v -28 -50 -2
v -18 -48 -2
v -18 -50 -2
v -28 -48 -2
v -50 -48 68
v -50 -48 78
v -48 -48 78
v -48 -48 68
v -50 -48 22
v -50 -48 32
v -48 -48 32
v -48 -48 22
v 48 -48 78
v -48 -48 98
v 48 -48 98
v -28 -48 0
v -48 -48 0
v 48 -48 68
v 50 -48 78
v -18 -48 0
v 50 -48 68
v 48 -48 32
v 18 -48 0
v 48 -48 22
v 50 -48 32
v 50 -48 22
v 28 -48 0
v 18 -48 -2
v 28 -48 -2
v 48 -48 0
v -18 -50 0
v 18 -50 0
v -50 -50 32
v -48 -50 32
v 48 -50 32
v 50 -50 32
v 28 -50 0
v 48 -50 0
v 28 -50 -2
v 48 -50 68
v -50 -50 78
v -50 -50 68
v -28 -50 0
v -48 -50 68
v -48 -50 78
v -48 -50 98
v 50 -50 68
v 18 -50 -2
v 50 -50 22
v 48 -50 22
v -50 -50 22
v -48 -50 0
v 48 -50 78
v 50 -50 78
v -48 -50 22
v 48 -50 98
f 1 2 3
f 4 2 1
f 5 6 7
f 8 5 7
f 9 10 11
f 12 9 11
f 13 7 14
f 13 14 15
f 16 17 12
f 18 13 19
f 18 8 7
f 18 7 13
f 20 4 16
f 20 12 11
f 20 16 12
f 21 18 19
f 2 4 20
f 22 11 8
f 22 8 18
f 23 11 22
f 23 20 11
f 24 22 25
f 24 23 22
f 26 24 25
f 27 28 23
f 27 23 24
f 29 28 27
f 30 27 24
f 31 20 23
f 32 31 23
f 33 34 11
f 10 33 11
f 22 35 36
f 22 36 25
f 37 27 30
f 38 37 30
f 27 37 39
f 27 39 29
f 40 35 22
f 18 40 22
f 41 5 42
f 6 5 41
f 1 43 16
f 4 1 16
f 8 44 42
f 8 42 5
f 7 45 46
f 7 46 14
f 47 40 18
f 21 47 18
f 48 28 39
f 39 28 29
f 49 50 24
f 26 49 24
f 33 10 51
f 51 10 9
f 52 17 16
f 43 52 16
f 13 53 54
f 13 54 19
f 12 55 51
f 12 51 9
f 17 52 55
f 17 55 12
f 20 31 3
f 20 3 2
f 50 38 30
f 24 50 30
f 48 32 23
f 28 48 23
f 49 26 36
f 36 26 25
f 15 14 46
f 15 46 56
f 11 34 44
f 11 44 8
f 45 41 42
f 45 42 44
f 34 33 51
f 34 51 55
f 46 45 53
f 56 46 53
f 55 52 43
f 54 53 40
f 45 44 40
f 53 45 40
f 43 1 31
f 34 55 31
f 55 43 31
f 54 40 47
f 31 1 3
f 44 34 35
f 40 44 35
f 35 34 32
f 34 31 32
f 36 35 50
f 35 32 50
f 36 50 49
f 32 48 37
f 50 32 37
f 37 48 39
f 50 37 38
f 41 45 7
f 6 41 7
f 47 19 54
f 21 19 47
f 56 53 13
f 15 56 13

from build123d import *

# Parameters (mm, degrees)
SKETCH1_W           = 96
SKETCH1_H           = 2
BOSS_EXTRUDE1_DEPTH = 98
SKETCH2_W           = 10
SKETCH2_H           = 2
BOSS_EXTRUDE2_DEPTH = 2
SKETCH3_W           = 10
SKETCH3_H           = 2
BOSS_EXTRUDE3_DEPTH = 2
SKETCH4_W           = 10
SKETCH4_H           = 2
BOSS_EXTRUDE4_DEPTH = 2


with BuildPart() as part:
    # Sketch1 → Boss-Extrude1 (new body)
    with BuildSketch(Plane.XY):
        with Locations((0, -49)):
            Rectangle(SKETCH1_W, SKETCH1_H)
    extrude(amount=BOSS_EXTRUDE1_DEPTH)

    # Sketch2 → Boss-Extrude2 (add)
    with BuildSketch(Plane.ZY.offset(48)):
        with Locations((73, -49)):
            Rectangle(SKETCH2_W, SKETCH2_H)
    boss_extrude2 = extrude(amount=BOSS_EXTRUDE2_DEPTH)

    # Mirror1: Boss-Extrude2 across plane
    add(boss_extrude2.mirror(Plane.XY.offset(50)))

    # Sketch3 → Boss-Extrude3 (add)
    with BuildSketch(Plane(origin=(48, 0, 0), x_dir=(0, 0, -1), z_dir=(1, 0, 0))):
        with Locations((-73, -49)):
            Rectangle(SKETCH3_W, SKETCH3_H)
    boss_extrude3 = extrude(amount=BOSS_EXTRUDE3_DEPTH)

    # Mirror2: Boss-Extrude3 across plane
    add(boss_extrude3.mirror(Plane.XY.offset(50)))

    # Sketch4 → Boss-Extrude4 (add)
    with BuildSketch(Plane(origin=(0, 0, 0), x_dir=(-1, 0, 0), z_dir=(0, 0, -1))):
        with Locations((23, -49)):
            Rectangle(SKETCH4_W, SKETCH4_H)
    boss_extrude4 = extrude(amount=BOSS_EXTRUDE4_DEPTH)

    # Mirror3: Boss-Extrude4 across plane
    add(boss_extrude4.mirror(Plane(origin=(0, 0, 0), x_dir=(0, 0, 1), z_dir=(1, 0, 0))))


solid = part.part
